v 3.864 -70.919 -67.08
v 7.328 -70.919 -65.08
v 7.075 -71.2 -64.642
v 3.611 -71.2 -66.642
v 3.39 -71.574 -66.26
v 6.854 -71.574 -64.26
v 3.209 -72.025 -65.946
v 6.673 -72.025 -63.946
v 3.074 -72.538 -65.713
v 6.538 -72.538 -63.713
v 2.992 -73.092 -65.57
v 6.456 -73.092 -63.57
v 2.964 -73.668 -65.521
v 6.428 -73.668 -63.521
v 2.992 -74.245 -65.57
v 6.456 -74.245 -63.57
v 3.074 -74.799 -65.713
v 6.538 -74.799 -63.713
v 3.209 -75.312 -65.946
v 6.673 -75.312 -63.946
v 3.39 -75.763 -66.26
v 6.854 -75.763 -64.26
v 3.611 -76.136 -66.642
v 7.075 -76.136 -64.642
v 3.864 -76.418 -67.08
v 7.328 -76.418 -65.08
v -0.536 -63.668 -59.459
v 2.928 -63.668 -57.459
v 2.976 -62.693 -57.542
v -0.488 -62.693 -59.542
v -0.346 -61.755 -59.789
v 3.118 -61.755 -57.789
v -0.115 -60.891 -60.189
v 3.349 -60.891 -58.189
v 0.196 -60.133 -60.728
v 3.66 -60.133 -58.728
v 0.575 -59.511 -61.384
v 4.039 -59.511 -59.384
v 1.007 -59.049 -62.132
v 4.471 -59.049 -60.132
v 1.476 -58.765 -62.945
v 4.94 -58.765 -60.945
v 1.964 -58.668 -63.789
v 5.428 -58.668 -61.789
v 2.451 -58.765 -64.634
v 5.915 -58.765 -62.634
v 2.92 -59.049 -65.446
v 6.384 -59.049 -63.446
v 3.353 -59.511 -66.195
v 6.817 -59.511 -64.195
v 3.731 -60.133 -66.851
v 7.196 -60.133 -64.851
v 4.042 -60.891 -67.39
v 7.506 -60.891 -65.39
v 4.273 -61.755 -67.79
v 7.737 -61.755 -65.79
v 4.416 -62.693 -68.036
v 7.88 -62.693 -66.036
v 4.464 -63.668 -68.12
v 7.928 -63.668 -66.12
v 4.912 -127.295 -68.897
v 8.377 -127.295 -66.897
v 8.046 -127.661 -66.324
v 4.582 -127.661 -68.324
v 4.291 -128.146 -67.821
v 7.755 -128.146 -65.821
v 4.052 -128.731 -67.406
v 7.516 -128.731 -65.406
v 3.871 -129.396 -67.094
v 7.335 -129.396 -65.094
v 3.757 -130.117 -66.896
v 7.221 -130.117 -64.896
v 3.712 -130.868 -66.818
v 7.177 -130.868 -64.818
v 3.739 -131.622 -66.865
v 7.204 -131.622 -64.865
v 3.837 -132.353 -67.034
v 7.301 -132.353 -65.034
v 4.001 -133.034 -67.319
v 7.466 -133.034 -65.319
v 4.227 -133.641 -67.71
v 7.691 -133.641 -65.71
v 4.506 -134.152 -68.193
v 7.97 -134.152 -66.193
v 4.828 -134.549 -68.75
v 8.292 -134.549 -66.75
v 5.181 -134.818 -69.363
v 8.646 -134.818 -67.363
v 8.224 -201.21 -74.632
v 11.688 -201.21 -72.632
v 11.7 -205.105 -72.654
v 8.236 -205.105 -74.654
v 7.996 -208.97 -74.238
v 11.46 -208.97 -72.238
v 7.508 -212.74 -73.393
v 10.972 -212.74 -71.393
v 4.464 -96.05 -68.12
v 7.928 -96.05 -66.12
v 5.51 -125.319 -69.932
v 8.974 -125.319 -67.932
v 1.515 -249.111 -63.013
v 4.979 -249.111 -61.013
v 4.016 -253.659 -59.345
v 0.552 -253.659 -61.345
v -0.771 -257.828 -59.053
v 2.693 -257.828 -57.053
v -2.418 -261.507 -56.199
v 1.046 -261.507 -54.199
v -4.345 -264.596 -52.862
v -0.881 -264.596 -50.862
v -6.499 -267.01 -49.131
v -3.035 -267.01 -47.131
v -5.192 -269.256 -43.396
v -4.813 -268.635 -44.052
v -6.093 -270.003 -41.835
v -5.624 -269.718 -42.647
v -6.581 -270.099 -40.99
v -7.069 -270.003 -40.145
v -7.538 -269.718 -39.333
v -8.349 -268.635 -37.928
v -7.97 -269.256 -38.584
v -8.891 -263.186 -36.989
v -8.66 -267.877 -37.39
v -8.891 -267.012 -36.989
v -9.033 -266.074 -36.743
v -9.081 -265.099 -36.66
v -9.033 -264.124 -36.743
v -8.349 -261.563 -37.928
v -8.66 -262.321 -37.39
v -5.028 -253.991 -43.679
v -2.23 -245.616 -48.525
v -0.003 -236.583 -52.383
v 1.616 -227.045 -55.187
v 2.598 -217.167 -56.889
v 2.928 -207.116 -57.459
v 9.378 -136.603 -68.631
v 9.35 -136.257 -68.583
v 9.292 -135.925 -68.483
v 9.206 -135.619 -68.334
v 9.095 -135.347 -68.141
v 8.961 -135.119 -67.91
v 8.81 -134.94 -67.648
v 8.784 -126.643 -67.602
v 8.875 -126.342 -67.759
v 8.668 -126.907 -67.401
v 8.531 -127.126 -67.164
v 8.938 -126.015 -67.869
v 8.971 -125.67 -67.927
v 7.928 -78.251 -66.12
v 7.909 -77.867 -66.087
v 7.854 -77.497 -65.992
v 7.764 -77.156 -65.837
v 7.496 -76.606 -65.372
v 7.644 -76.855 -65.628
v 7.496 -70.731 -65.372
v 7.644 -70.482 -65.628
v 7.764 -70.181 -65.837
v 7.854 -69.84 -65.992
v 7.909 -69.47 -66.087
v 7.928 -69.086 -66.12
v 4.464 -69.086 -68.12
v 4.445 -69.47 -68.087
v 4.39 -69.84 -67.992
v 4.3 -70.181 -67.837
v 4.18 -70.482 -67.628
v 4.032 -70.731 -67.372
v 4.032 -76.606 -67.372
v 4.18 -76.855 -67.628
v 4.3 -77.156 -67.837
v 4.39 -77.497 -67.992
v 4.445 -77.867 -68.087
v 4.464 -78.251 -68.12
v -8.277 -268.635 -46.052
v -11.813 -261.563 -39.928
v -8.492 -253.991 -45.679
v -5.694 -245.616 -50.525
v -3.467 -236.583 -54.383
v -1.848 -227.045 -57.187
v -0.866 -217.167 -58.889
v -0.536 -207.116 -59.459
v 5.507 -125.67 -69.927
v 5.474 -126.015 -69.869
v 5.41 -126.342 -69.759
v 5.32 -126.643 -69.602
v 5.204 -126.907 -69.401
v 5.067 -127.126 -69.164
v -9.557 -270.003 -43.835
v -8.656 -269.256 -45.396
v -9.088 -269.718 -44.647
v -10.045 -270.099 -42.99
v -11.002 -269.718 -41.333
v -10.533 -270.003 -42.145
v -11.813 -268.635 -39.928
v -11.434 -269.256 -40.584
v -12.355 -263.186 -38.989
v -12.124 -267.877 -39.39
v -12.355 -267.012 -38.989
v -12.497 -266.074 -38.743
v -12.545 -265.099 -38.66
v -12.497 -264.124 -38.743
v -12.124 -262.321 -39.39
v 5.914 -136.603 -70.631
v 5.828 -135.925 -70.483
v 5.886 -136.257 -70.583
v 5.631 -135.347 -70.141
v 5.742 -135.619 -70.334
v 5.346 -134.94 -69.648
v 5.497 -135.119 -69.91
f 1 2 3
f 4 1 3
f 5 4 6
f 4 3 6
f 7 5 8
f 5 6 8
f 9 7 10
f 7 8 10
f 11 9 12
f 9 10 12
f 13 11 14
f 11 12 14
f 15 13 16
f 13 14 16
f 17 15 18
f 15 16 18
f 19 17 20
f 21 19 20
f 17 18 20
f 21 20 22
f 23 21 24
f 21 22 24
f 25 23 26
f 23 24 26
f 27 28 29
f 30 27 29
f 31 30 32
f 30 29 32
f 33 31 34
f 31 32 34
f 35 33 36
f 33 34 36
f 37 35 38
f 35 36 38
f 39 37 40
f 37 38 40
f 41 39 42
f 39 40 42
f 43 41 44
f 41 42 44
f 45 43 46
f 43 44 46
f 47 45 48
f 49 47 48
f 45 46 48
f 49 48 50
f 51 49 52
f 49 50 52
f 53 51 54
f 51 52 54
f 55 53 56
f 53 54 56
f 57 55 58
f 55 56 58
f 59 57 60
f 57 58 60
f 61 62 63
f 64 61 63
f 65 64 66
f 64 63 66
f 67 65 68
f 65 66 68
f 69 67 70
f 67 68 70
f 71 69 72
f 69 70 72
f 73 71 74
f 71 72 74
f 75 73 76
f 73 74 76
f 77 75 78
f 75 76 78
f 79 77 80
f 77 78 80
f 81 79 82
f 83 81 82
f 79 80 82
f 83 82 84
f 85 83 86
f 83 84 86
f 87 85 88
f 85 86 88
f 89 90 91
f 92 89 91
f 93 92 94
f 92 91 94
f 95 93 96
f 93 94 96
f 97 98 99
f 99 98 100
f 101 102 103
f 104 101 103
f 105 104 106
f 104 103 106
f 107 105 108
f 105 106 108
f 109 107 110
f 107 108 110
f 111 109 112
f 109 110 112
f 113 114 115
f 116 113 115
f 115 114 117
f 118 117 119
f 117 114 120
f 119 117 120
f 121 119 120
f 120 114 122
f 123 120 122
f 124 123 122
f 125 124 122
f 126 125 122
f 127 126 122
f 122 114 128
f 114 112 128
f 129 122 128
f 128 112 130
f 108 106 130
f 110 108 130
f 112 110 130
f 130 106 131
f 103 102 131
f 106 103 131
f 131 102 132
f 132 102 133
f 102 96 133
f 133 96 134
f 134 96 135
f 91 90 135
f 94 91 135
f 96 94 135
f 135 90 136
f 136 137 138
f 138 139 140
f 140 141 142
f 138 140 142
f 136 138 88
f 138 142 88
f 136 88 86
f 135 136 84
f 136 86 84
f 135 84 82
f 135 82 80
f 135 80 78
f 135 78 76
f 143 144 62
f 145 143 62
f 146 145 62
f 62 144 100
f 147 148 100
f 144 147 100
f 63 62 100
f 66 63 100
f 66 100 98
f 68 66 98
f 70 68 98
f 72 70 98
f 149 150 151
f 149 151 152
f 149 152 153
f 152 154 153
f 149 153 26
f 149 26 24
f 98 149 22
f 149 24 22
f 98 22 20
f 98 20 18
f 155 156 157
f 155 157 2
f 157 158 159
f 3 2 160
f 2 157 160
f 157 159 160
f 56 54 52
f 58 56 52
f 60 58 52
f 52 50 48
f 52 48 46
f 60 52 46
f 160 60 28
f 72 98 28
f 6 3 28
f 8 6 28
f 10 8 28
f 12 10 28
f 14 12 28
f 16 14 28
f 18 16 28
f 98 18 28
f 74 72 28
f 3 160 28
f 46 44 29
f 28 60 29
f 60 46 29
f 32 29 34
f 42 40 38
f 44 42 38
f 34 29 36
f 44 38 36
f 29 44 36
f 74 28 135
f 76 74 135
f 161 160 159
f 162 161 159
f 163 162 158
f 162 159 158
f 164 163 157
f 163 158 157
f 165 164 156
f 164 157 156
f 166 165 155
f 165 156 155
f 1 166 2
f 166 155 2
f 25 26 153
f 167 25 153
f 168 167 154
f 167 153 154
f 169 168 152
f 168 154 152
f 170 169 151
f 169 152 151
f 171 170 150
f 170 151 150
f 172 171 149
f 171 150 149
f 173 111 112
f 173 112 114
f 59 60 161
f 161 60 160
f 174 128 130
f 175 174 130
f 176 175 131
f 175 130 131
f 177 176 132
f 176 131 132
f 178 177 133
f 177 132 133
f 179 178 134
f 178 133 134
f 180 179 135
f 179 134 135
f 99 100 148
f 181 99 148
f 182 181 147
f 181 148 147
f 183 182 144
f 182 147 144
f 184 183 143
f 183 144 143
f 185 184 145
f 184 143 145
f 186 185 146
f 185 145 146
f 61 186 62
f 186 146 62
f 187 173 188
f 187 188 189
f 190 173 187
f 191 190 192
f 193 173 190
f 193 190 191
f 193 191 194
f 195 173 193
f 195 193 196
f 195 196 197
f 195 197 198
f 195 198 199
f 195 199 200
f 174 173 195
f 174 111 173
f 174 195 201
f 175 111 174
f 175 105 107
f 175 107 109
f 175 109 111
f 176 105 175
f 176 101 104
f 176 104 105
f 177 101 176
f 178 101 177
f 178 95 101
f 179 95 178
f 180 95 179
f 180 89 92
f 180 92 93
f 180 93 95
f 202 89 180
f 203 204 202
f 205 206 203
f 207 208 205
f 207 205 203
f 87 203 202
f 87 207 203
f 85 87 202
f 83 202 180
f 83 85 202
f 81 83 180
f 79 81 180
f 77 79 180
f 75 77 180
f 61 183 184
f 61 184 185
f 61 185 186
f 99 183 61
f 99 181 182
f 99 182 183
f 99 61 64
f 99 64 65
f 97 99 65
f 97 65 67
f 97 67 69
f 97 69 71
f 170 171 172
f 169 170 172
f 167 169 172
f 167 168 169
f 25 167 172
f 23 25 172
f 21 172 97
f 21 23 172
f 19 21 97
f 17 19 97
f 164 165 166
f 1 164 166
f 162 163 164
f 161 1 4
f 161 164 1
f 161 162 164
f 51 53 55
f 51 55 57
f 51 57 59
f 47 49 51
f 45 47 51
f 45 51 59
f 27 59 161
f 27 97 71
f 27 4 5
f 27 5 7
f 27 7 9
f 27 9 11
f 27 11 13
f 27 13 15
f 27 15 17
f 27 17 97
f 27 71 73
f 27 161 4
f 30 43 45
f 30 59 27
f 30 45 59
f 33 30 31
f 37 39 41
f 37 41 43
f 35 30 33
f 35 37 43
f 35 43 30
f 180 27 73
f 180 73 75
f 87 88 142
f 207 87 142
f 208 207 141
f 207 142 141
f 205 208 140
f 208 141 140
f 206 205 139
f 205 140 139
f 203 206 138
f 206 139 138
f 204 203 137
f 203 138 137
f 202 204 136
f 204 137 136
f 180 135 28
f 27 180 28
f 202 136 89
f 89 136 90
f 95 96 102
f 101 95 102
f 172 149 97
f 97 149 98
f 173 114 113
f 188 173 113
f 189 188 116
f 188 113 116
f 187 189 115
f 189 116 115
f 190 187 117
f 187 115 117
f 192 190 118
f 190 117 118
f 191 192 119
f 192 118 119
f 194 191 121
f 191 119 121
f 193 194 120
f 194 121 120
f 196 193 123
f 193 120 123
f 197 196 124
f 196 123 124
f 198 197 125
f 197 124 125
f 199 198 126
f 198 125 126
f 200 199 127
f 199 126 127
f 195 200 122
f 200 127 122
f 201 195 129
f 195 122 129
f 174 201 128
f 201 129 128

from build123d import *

# Parameters (mm, degrees)
BOSS_EXTRUDE1_DEPTH = 4


with BuildPart() as part:
    # Sketch1 → Boss-Extrude1 (new body)
    with BuildSketch(Plane(origin=(-22.684789061, 0, -13.097069071), x_dir=(-0.5, 0, 0.866025404), z_dir=(-0.866025404, 0, -0.5))):
        with BuildLine():
            Line((-51.22508588, -207.116263928), (-51.22508588, -63.668461088))
            ThreePointArc((-51.22508588, -63.668461088), (-56.22508588, -58.668461088), (-61.22508588, -63.668461088))
            Line((-61.22508588, -63.668461088), (-61.22508588, -69.085885393))
            ThreePointArc((-61.22508588, -69.085885393), (-60.898405933, -70.181330508), (-60.02508588, -70.918915671))
            ThreePointArc((-60.02508588, -70.918915671), (-58.22508588, -73.668461088), (-60.02508588, -76.418006505))
            ThreePointArc((-60.02508588, -76.418006505), (-60.898405933, -77.155591668), (-61.22508588, -78.251036783))
            Line((-61.22508588, -78.251036783), (-61.22508588, -96.050188948))
            Line((-61.22508588, -96.050188948), (-63.318074095, -125.318595172))
            ThreePointArc((-63.318074095, -125.318595172), (-63.034364548, -126.496532456), (-62.122634264, -127.294514437))
            ThreePointArc((-62.122634264, -127.294514437), (-59.731754601, -131.246352968), (-62.660623811, -134.817775441))
            ThreePointArc((-62.660623811, -134.817775441), (-63.676623884, -135.477905129), (-64.125058417, -136.603486678))
            Line((-64.125058417, -136.603486678), (-68.745111695, -201.210442006))
            ThreePointArc((-68.745111695, -201.210442006), (-68.593140236, -207.044992568), (-67.314310613, -212.739698038))
            Line((-67.314310613, -212.739698038), (-55.328501922, -249.111405981))
            ThreePointArc((-55.328501922, -249.111405981), (-49.184106644, -259.735720996), (-39.299344022, -267.010412109))
            Line((-39.299344022, -267.010412109), (-35.743375843, -268.634553892))
            ThreePointArc((-35.743375843, -268.634553892), (-28.672308031, -268.634553892), (-28.672308031, -261.56348608))
            ThreePointArc((-28.672308031, -261.56348608), (-45.363809883, -236.582888221), (-51.22508588, -207.116263928))
        make_face()
    extrude(amount=BOSS_EXTRUDE1_DEPTH)


solid = part.part
